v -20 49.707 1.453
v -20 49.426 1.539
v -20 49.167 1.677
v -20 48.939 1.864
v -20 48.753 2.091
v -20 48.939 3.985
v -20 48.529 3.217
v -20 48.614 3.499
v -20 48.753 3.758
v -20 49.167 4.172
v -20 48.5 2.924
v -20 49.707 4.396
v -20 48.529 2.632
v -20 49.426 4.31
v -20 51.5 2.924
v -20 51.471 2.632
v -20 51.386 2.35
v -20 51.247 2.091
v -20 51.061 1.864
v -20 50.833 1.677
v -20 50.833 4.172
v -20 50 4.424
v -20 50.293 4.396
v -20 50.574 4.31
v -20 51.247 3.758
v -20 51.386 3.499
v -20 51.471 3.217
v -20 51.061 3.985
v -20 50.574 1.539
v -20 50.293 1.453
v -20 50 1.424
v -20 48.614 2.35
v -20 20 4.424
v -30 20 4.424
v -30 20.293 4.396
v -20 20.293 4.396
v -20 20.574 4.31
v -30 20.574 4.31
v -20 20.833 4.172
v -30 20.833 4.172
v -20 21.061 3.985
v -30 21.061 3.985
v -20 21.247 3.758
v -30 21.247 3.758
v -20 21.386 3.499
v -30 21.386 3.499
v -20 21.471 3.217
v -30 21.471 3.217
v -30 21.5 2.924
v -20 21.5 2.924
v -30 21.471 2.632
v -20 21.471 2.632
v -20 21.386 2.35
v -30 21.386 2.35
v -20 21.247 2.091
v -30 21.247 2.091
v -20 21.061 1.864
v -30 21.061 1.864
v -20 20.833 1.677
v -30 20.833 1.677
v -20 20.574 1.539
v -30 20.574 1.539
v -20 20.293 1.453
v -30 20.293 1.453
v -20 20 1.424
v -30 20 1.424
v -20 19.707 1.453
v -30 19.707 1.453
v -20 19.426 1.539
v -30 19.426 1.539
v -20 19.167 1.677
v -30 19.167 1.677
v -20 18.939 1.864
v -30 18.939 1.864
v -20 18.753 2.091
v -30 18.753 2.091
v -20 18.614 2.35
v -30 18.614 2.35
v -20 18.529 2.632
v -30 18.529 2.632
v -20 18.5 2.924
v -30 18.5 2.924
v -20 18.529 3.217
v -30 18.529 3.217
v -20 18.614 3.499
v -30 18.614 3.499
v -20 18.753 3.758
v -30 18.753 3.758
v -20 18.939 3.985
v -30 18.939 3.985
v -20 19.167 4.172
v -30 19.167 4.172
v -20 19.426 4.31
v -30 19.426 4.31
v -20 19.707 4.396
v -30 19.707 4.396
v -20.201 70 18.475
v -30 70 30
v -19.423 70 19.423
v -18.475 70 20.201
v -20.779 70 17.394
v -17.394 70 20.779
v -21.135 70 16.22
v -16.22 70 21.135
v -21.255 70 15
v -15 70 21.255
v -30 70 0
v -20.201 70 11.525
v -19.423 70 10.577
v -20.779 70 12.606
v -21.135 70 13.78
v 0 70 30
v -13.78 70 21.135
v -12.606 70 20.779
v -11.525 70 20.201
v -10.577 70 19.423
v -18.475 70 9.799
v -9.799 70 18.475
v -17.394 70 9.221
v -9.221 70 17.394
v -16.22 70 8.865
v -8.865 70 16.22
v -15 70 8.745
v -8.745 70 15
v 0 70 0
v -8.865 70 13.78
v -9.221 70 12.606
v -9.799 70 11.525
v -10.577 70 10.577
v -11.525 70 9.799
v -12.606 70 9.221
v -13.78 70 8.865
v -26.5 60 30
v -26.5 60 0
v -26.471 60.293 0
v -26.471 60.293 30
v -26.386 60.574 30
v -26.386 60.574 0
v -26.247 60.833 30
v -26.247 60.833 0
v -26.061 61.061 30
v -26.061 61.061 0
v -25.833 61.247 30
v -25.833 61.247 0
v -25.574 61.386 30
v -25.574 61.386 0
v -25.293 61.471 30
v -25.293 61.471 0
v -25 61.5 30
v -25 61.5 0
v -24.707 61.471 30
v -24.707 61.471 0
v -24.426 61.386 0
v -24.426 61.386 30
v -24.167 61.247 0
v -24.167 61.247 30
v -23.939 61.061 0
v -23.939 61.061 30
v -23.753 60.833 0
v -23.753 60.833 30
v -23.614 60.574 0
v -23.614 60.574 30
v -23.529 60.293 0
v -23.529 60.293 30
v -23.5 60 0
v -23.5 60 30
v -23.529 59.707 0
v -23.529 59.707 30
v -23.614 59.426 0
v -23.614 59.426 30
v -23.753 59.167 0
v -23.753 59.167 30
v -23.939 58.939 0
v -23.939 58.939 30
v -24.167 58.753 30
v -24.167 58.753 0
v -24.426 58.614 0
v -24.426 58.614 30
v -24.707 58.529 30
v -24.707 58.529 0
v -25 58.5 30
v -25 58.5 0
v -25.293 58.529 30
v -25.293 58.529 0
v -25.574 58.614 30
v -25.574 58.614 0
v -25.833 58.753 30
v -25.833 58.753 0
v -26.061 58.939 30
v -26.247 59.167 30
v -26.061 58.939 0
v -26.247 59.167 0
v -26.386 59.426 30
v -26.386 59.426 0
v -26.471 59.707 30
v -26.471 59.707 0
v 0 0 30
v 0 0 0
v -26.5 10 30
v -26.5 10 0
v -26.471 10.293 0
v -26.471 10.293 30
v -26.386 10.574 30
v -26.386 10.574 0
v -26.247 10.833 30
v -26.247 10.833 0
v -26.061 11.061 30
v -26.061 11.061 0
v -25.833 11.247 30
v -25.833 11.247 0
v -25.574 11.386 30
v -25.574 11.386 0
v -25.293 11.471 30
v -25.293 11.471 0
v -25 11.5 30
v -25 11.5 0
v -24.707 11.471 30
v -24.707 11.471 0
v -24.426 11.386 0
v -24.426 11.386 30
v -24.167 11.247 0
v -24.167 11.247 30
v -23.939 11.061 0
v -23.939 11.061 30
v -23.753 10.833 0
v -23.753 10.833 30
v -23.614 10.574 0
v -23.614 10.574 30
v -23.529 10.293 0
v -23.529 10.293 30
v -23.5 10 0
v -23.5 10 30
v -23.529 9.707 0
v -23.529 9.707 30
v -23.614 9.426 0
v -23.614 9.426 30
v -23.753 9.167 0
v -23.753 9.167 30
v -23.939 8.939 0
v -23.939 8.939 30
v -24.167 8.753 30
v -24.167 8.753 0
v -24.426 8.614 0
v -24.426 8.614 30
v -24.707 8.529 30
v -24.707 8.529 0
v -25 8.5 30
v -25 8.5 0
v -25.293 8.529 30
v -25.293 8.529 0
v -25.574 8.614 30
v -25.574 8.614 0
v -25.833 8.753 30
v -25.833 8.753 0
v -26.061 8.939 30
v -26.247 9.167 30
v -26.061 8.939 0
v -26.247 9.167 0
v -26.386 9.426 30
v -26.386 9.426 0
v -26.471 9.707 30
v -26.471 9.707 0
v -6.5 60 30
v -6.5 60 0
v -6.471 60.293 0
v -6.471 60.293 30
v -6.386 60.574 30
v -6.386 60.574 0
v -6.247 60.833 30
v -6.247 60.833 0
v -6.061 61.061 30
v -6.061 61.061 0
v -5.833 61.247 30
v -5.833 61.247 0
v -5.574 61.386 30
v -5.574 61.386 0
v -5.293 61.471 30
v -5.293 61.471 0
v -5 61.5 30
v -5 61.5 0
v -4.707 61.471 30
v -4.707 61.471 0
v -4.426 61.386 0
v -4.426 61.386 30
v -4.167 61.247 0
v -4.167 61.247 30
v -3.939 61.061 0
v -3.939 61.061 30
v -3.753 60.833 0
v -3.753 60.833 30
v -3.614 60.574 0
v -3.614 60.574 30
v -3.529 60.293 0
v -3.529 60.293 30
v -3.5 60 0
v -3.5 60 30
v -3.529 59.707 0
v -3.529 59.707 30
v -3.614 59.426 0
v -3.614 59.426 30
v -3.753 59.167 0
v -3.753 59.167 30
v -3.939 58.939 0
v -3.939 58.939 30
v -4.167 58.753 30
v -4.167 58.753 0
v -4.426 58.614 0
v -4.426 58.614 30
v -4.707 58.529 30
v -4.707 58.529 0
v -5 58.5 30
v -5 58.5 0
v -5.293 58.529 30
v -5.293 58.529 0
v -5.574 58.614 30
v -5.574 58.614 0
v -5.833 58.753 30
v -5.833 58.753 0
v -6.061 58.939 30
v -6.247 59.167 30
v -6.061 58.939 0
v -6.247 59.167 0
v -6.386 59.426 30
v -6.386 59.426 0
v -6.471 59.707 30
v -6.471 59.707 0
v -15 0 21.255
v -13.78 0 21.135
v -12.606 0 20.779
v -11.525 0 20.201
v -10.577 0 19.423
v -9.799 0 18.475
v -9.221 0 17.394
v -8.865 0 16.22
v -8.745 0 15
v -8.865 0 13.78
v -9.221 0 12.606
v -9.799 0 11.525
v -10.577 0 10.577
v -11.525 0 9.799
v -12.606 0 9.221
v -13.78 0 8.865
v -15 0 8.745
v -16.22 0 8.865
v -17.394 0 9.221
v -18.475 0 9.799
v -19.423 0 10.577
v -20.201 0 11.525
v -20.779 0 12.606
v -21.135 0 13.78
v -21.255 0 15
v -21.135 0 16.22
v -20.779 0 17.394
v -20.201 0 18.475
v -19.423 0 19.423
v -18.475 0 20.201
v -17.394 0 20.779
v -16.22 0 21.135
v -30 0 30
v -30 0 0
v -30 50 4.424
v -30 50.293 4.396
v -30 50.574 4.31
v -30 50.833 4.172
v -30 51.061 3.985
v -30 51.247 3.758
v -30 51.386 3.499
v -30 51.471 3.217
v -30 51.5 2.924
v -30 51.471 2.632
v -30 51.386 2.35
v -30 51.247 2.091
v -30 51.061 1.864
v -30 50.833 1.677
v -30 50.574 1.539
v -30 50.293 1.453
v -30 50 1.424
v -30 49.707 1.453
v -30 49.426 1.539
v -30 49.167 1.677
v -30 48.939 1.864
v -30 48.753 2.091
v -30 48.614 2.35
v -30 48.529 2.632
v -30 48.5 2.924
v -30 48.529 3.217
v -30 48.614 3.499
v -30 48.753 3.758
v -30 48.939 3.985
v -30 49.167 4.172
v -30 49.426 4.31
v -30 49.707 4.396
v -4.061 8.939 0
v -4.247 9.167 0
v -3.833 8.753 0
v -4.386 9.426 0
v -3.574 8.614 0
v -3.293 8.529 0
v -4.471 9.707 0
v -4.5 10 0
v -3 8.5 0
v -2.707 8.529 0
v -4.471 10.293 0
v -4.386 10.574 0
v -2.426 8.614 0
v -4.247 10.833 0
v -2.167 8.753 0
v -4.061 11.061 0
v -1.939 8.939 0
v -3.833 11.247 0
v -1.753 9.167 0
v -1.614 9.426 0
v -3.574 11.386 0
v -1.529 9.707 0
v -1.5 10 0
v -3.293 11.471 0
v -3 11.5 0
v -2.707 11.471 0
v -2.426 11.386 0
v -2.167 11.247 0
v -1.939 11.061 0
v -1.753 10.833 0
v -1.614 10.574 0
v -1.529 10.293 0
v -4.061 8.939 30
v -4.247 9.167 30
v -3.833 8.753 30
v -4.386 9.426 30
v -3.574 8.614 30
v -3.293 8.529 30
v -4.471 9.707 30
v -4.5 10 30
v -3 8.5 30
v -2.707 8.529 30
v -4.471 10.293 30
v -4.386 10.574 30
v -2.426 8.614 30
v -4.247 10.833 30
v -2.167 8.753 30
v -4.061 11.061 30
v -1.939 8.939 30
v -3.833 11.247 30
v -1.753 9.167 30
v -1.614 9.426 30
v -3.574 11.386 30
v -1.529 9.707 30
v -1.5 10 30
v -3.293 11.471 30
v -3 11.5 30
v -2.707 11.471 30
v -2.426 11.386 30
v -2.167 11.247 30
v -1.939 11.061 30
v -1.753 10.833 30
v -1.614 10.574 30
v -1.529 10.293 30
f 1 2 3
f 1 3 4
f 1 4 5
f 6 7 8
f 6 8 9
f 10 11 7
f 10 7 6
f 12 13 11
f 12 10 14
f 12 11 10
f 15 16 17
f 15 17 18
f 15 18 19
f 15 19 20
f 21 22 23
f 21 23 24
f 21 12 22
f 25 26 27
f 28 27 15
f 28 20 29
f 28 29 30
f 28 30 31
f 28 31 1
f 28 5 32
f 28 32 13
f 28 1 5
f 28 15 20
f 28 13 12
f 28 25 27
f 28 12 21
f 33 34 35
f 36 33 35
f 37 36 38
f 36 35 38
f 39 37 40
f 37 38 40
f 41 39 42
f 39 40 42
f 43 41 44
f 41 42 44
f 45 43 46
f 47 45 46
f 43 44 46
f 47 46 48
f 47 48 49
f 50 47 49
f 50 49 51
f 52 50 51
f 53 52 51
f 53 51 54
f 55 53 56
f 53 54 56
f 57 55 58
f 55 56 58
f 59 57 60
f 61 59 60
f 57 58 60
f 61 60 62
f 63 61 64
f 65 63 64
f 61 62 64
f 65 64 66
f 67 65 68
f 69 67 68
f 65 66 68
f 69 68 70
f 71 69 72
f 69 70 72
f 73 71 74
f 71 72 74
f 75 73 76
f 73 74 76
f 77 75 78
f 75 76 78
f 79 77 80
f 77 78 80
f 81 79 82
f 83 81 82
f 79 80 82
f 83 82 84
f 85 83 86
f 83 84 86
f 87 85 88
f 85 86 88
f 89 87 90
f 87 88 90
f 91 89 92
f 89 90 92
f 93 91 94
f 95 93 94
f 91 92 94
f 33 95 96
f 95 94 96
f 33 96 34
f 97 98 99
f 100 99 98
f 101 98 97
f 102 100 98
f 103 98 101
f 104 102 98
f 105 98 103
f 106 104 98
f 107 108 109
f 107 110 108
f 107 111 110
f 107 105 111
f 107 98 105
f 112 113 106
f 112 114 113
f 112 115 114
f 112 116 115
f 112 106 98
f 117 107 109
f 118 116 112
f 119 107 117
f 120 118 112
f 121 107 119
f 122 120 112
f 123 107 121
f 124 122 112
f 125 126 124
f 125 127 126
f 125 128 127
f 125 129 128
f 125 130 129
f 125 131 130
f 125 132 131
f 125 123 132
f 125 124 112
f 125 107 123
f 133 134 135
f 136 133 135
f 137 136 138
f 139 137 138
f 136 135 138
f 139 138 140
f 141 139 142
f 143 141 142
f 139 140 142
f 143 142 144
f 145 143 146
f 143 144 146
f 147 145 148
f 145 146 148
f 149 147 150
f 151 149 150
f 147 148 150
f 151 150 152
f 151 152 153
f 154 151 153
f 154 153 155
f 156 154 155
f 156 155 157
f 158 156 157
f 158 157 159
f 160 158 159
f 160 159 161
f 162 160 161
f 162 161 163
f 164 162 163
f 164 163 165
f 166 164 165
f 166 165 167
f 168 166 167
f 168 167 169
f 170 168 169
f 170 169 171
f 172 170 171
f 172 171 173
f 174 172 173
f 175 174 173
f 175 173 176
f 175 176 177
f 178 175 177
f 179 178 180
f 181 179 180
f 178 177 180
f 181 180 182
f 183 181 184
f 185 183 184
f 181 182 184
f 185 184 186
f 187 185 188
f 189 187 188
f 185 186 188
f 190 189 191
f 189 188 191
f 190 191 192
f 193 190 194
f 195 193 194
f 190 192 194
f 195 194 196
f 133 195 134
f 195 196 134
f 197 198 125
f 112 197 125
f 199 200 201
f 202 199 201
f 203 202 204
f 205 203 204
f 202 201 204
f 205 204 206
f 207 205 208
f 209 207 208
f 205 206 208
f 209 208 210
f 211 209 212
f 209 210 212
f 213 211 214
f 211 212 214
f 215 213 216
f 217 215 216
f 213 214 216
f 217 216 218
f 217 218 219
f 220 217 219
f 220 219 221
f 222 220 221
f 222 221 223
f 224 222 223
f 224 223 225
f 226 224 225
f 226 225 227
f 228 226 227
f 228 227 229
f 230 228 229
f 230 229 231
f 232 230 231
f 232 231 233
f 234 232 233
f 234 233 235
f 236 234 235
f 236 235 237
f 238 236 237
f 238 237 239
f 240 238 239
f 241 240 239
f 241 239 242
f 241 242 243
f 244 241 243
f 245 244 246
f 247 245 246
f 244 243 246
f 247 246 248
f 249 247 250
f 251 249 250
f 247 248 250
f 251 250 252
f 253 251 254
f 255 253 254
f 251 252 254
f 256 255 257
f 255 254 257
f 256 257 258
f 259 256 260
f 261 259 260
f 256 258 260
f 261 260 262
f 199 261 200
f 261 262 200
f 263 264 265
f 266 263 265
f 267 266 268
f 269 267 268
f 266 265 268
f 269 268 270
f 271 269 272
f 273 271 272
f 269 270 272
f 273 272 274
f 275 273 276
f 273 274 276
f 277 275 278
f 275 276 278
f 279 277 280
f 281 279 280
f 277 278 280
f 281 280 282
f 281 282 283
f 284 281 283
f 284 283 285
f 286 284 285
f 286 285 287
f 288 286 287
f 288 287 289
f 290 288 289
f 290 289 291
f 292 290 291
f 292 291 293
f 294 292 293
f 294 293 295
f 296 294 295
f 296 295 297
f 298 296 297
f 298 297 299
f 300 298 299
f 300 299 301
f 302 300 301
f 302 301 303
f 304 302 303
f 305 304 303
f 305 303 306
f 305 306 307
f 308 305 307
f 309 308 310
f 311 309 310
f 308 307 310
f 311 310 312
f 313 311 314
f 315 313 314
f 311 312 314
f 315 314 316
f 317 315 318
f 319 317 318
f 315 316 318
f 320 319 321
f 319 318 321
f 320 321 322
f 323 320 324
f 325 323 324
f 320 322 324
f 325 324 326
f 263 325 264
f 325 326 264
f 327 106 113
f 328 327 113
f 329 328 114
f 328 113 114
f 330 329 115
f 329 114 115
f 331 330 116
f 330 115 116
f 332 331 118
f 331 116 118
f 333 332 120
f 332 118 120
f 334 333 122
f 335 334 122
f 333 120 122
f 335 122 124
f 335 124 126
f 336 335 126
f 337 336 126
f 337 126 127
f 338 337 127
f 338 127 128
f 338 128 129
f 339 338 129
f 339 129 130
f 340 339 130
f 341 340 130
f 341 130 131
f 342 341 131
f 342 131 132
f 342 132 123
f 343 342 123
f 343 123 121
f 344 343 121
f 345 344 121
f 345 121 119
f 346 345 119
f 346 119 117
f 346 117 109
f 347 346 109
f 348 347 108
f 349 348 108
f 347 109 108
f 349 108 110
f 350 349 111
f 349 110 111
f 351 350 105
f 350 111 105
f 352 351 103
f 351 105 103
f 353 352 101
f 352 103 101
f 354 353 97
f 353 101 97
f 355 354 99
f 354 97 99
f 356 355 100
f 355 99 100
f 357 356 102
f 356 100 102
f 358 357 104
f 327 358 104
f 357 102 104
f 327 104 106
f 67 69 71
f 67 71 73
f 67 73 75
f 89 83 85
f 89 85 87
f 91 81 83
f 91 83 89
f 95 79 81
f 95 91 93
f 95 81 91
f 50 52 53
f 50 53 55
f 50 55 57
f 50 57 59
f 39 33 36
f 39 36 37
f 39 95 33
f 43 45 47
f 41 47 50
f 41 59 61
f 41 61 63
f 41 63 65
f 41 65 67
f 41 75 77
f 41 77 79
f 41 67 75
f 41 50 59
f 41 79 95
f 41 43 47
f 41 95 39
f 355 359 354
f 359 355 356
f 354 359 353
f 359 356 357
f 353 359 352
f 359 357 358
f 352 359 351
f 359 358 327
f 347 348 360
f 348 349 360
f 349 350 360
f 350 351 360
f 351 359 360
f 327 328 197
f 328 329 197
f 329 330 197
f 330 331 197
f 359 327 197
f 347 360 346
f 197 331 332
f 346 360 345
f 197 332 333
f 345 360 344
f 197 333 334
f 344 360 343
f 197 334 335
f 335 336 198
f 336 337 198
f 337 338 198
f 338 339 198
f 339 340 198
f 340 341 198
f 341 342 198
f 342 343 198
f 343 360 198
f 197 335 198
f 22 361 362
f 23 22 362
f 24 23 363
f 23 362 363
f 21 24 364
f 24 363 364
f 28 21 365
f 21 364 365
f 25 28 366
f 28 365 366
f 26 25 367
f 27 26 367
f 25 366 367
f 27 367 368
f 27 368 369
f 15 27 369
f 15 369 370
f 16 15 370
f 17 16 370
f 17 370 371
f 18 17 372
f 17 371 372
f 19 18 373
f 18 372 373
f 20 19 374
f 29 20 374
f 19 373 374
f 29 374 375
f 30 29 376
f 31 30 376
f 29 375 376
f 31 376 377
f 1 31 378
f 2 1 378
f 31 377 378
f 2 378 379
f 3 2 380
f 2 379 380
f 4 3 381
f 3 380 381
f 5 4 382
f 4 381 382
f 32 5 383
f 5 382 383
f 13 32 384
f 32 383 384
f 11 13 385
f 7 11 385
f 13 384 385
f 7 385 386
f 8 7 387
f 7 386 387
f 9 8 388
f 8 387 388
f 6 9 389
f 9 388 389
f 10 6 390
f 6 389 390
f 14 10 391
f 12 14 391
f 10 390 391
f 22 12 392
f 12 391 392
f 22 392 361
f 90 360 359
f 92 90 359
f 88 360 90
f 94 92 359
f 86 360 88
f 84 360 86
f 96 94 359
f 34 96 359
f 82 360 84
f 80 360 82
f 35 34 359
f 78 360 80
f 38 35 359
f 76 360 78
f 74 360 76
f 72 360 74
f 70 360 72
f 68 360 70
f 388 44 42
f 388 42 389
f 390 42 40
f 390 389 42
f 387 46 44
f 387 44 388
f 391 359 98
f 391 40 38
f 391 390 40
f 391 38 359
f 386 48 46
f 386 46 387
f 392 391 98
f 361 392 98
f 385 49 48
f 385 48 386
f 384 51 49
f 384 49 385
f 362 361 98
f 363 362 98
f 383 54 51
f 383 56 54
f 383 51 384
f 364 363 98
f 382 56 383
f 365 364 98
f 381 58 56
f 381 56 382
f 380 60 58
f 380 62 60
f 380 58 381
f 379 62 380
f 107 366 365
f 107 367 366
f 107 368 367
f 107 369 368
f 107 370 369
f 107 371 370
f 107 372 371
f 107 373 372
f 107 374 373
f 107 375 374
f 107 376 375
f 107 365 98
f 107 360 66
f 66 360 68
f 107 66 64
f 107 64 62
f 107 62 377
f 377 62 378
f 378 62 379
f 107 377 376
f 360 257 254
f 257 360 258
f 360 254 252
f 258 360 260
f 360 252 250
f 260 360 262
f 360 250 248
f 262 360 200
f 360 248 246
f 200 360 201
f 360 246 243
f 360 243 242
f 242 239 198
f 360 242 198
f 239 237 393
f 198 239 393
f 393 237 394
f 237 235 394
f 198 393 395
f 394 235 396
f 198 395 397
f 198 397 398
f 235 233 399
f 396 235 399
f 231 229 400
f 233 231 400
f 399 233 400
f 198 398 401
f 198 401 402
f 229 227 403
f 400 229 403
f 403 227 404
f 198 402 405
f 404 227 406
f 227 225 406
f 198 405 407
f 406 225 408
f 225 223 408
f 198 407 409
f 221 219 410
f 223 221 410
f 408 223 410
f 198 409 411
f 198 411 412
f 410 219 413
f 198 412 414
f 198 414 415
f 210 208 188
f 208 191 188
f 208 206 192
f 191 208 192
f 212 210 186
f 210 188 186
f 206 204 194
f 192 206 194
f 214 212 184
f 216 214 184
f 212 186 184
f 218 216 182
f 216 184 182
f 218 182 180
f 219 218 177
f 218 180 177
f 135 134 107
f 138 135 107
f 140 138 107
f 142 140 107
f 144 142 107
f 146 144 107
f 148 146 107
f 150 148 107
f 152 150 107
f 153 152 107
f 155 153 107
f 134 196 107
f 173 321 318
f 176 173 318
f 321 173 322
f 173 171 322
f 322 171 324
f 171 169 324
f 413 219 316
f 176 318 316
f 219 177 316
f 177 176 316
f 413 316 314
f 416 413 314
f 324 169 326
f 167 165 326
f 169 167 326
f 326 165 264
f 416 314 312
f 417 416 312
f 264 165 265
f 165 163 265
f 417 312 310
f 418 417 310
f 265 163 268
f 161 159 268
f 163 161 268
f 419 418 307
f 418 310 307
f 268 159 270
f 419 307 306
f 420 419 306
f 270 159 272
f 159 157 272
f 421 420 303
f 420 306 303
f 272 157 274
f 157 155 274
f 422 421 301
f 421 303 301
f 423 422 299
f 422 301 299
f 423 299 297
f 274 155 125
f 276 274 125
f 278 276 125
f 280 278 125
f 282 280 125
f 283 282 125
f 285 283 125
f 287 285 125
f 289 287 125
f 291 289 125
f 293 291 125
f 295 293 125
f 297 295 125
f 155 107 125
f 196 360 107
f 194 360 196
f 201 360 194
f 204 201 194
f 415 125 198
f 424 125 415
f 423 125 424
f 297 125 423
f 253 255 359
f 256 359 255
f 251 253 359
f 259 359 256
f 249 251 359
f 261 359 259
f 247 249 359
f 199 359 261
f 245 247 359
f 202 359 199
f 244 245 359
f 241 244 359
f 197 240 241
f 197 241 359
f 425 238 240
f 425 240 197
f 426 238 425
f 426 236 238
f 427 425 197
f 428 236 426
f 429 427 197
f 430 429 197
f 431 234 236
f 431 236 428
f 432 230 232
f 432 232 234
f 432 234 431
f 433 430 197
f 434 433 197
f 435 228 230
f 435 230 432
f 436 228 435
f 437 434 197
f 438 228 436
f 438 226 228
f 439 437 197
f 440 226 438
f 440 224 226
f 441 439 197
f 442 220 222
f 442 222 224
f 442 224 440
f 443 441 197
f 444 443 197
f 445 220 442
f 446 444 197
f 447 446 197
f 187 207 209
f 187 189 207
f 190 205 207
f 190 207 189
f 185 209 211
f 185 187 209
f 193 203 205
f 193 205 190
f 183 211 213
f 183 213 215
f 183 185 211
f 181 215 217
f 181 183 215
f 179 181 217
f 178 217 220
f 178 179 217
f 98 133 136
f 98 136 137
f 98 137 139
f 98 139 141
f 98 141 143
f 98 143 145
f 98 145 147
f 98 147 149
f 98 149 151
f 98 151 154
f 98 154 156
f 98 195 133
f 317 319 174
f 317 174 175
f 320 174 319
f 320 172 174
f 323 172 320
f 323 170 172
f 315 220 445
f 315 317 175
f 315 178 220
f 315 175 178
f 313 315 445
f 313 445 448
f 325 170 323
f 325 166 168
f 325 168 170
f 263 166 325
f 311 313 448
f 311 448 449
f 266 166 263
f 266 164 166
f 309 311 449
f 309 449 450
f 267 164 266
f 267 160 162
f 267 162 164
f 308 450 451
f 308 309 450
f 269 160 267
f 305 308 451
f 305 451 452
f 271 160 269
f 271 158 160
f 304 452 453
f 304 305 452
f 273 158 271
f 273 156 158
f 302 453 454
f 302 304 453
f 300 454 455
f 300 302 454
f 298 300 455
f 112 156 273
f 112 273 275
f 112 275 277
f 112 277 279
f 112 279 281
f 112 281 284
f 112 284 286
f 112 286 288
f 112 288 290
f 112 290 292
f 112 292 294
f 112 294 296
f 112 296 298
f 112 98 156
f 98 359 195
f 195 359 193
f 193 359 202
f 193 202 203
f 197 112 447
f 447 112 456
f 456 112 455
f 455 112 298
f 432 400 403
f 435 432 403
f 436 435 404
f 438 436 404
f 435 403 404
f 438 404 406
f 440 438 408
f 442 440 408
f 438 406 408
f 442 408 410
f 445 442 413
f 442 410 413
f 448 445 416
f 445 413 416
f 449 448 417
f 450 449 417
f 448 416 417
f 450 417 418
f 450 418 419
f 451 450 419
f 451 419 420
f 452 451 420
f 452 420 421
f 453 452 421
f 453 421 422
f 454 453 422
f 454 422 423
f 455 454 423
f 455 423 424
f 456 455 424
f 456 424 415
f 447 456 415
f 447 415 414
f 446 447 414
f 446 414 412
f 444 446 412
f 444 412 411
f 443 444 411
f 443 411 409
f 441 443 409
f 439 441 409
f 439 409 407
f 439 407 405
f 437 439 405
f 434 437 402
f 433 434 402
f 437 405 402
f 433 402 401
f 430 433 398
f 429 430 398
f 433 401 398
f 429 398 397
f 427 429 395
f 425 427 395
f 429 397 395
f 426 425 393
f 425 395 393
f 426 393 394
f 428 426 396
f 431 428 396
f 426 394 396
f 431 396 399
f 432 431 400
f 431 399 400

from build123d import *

# Parameters (mm, degrees)
ESBO_O1_W                = 30
ESBO_O1_H                = 70
RESSALTO_EXTRUS_O1_DEPTH = 30
ESBO_O3_R                = 6.255
CORTE_EXTRUS_O2_DEPTH    = 82.853527719
ESBO_O4_R                = 1.5
CORTE_EXTRUS_O3_DEPTH    = 82.853527719
ESBO_O5_R                = 1.5
CORTE_EXTRUS_O4_DEPTH    = 10


with BuildPart() as part:
    # Esboço1 → Ressalto-extrusão1 (new body)
    with BuildSketch(Plane.XY):
        with Locations((-15, 35)):
            Rectangle(ESBO_O1_W, ESBO_O1_H)
    extrude(amount=RESSALTO_EXTRUS_O1_DEPTH)

    # Esboço3 → Corte-extrusão2 (cut, through all)
    with BuildSketch(Plane(origin=(0, 70, 0), x_dir=(1, 0, 0), z_dir=(0, 1, 0))):
        with Locations(Location((-15, -15, 0), (0, 0, 270))):
            Circle(ESBO_O3_R)
    extrude(amount=-CORTE_EXTRUS_O2_DEPTH, mode=Mode.SUBTRACT)

    # Esboço4 → Corte-extrusão3 (cut, through all)
    with BuildSketch(Plane(origin=(0, 0, 0), x_dir=(-1, 0, 0), z_dir=(0, 0, -1))):
        with Locations((5, 60)):
            Circle(ESBO_O4_R)
        with Locations((3, 10)):
            Circle(ESBO_O4_R)
        with Locations((25, 60)):
            Circle(ESBO_O4_R)
        with Locations((25, 10)):
            Circle(ESBO_O4_R)
    extrude(amount=-CORTE_EXTRUS_O3_DEPTH, mode=Mode.SUBTRACT)

    # Esboço5 → Corte-extrusão4 (cut)
    with BuildSketch(Plane.ZY.offset(30)):
        with Locations((2.924479503, 50)):
            Circle(ESBO_O5_R)
        with Locations((2.924479503, 20)):
            Circle(ESBO_O5_R)
    extrude(amount=-CORTE_EXTRUS_O4_DEPTH, mode=Mode.SUBTRACT)


solid = part.part
